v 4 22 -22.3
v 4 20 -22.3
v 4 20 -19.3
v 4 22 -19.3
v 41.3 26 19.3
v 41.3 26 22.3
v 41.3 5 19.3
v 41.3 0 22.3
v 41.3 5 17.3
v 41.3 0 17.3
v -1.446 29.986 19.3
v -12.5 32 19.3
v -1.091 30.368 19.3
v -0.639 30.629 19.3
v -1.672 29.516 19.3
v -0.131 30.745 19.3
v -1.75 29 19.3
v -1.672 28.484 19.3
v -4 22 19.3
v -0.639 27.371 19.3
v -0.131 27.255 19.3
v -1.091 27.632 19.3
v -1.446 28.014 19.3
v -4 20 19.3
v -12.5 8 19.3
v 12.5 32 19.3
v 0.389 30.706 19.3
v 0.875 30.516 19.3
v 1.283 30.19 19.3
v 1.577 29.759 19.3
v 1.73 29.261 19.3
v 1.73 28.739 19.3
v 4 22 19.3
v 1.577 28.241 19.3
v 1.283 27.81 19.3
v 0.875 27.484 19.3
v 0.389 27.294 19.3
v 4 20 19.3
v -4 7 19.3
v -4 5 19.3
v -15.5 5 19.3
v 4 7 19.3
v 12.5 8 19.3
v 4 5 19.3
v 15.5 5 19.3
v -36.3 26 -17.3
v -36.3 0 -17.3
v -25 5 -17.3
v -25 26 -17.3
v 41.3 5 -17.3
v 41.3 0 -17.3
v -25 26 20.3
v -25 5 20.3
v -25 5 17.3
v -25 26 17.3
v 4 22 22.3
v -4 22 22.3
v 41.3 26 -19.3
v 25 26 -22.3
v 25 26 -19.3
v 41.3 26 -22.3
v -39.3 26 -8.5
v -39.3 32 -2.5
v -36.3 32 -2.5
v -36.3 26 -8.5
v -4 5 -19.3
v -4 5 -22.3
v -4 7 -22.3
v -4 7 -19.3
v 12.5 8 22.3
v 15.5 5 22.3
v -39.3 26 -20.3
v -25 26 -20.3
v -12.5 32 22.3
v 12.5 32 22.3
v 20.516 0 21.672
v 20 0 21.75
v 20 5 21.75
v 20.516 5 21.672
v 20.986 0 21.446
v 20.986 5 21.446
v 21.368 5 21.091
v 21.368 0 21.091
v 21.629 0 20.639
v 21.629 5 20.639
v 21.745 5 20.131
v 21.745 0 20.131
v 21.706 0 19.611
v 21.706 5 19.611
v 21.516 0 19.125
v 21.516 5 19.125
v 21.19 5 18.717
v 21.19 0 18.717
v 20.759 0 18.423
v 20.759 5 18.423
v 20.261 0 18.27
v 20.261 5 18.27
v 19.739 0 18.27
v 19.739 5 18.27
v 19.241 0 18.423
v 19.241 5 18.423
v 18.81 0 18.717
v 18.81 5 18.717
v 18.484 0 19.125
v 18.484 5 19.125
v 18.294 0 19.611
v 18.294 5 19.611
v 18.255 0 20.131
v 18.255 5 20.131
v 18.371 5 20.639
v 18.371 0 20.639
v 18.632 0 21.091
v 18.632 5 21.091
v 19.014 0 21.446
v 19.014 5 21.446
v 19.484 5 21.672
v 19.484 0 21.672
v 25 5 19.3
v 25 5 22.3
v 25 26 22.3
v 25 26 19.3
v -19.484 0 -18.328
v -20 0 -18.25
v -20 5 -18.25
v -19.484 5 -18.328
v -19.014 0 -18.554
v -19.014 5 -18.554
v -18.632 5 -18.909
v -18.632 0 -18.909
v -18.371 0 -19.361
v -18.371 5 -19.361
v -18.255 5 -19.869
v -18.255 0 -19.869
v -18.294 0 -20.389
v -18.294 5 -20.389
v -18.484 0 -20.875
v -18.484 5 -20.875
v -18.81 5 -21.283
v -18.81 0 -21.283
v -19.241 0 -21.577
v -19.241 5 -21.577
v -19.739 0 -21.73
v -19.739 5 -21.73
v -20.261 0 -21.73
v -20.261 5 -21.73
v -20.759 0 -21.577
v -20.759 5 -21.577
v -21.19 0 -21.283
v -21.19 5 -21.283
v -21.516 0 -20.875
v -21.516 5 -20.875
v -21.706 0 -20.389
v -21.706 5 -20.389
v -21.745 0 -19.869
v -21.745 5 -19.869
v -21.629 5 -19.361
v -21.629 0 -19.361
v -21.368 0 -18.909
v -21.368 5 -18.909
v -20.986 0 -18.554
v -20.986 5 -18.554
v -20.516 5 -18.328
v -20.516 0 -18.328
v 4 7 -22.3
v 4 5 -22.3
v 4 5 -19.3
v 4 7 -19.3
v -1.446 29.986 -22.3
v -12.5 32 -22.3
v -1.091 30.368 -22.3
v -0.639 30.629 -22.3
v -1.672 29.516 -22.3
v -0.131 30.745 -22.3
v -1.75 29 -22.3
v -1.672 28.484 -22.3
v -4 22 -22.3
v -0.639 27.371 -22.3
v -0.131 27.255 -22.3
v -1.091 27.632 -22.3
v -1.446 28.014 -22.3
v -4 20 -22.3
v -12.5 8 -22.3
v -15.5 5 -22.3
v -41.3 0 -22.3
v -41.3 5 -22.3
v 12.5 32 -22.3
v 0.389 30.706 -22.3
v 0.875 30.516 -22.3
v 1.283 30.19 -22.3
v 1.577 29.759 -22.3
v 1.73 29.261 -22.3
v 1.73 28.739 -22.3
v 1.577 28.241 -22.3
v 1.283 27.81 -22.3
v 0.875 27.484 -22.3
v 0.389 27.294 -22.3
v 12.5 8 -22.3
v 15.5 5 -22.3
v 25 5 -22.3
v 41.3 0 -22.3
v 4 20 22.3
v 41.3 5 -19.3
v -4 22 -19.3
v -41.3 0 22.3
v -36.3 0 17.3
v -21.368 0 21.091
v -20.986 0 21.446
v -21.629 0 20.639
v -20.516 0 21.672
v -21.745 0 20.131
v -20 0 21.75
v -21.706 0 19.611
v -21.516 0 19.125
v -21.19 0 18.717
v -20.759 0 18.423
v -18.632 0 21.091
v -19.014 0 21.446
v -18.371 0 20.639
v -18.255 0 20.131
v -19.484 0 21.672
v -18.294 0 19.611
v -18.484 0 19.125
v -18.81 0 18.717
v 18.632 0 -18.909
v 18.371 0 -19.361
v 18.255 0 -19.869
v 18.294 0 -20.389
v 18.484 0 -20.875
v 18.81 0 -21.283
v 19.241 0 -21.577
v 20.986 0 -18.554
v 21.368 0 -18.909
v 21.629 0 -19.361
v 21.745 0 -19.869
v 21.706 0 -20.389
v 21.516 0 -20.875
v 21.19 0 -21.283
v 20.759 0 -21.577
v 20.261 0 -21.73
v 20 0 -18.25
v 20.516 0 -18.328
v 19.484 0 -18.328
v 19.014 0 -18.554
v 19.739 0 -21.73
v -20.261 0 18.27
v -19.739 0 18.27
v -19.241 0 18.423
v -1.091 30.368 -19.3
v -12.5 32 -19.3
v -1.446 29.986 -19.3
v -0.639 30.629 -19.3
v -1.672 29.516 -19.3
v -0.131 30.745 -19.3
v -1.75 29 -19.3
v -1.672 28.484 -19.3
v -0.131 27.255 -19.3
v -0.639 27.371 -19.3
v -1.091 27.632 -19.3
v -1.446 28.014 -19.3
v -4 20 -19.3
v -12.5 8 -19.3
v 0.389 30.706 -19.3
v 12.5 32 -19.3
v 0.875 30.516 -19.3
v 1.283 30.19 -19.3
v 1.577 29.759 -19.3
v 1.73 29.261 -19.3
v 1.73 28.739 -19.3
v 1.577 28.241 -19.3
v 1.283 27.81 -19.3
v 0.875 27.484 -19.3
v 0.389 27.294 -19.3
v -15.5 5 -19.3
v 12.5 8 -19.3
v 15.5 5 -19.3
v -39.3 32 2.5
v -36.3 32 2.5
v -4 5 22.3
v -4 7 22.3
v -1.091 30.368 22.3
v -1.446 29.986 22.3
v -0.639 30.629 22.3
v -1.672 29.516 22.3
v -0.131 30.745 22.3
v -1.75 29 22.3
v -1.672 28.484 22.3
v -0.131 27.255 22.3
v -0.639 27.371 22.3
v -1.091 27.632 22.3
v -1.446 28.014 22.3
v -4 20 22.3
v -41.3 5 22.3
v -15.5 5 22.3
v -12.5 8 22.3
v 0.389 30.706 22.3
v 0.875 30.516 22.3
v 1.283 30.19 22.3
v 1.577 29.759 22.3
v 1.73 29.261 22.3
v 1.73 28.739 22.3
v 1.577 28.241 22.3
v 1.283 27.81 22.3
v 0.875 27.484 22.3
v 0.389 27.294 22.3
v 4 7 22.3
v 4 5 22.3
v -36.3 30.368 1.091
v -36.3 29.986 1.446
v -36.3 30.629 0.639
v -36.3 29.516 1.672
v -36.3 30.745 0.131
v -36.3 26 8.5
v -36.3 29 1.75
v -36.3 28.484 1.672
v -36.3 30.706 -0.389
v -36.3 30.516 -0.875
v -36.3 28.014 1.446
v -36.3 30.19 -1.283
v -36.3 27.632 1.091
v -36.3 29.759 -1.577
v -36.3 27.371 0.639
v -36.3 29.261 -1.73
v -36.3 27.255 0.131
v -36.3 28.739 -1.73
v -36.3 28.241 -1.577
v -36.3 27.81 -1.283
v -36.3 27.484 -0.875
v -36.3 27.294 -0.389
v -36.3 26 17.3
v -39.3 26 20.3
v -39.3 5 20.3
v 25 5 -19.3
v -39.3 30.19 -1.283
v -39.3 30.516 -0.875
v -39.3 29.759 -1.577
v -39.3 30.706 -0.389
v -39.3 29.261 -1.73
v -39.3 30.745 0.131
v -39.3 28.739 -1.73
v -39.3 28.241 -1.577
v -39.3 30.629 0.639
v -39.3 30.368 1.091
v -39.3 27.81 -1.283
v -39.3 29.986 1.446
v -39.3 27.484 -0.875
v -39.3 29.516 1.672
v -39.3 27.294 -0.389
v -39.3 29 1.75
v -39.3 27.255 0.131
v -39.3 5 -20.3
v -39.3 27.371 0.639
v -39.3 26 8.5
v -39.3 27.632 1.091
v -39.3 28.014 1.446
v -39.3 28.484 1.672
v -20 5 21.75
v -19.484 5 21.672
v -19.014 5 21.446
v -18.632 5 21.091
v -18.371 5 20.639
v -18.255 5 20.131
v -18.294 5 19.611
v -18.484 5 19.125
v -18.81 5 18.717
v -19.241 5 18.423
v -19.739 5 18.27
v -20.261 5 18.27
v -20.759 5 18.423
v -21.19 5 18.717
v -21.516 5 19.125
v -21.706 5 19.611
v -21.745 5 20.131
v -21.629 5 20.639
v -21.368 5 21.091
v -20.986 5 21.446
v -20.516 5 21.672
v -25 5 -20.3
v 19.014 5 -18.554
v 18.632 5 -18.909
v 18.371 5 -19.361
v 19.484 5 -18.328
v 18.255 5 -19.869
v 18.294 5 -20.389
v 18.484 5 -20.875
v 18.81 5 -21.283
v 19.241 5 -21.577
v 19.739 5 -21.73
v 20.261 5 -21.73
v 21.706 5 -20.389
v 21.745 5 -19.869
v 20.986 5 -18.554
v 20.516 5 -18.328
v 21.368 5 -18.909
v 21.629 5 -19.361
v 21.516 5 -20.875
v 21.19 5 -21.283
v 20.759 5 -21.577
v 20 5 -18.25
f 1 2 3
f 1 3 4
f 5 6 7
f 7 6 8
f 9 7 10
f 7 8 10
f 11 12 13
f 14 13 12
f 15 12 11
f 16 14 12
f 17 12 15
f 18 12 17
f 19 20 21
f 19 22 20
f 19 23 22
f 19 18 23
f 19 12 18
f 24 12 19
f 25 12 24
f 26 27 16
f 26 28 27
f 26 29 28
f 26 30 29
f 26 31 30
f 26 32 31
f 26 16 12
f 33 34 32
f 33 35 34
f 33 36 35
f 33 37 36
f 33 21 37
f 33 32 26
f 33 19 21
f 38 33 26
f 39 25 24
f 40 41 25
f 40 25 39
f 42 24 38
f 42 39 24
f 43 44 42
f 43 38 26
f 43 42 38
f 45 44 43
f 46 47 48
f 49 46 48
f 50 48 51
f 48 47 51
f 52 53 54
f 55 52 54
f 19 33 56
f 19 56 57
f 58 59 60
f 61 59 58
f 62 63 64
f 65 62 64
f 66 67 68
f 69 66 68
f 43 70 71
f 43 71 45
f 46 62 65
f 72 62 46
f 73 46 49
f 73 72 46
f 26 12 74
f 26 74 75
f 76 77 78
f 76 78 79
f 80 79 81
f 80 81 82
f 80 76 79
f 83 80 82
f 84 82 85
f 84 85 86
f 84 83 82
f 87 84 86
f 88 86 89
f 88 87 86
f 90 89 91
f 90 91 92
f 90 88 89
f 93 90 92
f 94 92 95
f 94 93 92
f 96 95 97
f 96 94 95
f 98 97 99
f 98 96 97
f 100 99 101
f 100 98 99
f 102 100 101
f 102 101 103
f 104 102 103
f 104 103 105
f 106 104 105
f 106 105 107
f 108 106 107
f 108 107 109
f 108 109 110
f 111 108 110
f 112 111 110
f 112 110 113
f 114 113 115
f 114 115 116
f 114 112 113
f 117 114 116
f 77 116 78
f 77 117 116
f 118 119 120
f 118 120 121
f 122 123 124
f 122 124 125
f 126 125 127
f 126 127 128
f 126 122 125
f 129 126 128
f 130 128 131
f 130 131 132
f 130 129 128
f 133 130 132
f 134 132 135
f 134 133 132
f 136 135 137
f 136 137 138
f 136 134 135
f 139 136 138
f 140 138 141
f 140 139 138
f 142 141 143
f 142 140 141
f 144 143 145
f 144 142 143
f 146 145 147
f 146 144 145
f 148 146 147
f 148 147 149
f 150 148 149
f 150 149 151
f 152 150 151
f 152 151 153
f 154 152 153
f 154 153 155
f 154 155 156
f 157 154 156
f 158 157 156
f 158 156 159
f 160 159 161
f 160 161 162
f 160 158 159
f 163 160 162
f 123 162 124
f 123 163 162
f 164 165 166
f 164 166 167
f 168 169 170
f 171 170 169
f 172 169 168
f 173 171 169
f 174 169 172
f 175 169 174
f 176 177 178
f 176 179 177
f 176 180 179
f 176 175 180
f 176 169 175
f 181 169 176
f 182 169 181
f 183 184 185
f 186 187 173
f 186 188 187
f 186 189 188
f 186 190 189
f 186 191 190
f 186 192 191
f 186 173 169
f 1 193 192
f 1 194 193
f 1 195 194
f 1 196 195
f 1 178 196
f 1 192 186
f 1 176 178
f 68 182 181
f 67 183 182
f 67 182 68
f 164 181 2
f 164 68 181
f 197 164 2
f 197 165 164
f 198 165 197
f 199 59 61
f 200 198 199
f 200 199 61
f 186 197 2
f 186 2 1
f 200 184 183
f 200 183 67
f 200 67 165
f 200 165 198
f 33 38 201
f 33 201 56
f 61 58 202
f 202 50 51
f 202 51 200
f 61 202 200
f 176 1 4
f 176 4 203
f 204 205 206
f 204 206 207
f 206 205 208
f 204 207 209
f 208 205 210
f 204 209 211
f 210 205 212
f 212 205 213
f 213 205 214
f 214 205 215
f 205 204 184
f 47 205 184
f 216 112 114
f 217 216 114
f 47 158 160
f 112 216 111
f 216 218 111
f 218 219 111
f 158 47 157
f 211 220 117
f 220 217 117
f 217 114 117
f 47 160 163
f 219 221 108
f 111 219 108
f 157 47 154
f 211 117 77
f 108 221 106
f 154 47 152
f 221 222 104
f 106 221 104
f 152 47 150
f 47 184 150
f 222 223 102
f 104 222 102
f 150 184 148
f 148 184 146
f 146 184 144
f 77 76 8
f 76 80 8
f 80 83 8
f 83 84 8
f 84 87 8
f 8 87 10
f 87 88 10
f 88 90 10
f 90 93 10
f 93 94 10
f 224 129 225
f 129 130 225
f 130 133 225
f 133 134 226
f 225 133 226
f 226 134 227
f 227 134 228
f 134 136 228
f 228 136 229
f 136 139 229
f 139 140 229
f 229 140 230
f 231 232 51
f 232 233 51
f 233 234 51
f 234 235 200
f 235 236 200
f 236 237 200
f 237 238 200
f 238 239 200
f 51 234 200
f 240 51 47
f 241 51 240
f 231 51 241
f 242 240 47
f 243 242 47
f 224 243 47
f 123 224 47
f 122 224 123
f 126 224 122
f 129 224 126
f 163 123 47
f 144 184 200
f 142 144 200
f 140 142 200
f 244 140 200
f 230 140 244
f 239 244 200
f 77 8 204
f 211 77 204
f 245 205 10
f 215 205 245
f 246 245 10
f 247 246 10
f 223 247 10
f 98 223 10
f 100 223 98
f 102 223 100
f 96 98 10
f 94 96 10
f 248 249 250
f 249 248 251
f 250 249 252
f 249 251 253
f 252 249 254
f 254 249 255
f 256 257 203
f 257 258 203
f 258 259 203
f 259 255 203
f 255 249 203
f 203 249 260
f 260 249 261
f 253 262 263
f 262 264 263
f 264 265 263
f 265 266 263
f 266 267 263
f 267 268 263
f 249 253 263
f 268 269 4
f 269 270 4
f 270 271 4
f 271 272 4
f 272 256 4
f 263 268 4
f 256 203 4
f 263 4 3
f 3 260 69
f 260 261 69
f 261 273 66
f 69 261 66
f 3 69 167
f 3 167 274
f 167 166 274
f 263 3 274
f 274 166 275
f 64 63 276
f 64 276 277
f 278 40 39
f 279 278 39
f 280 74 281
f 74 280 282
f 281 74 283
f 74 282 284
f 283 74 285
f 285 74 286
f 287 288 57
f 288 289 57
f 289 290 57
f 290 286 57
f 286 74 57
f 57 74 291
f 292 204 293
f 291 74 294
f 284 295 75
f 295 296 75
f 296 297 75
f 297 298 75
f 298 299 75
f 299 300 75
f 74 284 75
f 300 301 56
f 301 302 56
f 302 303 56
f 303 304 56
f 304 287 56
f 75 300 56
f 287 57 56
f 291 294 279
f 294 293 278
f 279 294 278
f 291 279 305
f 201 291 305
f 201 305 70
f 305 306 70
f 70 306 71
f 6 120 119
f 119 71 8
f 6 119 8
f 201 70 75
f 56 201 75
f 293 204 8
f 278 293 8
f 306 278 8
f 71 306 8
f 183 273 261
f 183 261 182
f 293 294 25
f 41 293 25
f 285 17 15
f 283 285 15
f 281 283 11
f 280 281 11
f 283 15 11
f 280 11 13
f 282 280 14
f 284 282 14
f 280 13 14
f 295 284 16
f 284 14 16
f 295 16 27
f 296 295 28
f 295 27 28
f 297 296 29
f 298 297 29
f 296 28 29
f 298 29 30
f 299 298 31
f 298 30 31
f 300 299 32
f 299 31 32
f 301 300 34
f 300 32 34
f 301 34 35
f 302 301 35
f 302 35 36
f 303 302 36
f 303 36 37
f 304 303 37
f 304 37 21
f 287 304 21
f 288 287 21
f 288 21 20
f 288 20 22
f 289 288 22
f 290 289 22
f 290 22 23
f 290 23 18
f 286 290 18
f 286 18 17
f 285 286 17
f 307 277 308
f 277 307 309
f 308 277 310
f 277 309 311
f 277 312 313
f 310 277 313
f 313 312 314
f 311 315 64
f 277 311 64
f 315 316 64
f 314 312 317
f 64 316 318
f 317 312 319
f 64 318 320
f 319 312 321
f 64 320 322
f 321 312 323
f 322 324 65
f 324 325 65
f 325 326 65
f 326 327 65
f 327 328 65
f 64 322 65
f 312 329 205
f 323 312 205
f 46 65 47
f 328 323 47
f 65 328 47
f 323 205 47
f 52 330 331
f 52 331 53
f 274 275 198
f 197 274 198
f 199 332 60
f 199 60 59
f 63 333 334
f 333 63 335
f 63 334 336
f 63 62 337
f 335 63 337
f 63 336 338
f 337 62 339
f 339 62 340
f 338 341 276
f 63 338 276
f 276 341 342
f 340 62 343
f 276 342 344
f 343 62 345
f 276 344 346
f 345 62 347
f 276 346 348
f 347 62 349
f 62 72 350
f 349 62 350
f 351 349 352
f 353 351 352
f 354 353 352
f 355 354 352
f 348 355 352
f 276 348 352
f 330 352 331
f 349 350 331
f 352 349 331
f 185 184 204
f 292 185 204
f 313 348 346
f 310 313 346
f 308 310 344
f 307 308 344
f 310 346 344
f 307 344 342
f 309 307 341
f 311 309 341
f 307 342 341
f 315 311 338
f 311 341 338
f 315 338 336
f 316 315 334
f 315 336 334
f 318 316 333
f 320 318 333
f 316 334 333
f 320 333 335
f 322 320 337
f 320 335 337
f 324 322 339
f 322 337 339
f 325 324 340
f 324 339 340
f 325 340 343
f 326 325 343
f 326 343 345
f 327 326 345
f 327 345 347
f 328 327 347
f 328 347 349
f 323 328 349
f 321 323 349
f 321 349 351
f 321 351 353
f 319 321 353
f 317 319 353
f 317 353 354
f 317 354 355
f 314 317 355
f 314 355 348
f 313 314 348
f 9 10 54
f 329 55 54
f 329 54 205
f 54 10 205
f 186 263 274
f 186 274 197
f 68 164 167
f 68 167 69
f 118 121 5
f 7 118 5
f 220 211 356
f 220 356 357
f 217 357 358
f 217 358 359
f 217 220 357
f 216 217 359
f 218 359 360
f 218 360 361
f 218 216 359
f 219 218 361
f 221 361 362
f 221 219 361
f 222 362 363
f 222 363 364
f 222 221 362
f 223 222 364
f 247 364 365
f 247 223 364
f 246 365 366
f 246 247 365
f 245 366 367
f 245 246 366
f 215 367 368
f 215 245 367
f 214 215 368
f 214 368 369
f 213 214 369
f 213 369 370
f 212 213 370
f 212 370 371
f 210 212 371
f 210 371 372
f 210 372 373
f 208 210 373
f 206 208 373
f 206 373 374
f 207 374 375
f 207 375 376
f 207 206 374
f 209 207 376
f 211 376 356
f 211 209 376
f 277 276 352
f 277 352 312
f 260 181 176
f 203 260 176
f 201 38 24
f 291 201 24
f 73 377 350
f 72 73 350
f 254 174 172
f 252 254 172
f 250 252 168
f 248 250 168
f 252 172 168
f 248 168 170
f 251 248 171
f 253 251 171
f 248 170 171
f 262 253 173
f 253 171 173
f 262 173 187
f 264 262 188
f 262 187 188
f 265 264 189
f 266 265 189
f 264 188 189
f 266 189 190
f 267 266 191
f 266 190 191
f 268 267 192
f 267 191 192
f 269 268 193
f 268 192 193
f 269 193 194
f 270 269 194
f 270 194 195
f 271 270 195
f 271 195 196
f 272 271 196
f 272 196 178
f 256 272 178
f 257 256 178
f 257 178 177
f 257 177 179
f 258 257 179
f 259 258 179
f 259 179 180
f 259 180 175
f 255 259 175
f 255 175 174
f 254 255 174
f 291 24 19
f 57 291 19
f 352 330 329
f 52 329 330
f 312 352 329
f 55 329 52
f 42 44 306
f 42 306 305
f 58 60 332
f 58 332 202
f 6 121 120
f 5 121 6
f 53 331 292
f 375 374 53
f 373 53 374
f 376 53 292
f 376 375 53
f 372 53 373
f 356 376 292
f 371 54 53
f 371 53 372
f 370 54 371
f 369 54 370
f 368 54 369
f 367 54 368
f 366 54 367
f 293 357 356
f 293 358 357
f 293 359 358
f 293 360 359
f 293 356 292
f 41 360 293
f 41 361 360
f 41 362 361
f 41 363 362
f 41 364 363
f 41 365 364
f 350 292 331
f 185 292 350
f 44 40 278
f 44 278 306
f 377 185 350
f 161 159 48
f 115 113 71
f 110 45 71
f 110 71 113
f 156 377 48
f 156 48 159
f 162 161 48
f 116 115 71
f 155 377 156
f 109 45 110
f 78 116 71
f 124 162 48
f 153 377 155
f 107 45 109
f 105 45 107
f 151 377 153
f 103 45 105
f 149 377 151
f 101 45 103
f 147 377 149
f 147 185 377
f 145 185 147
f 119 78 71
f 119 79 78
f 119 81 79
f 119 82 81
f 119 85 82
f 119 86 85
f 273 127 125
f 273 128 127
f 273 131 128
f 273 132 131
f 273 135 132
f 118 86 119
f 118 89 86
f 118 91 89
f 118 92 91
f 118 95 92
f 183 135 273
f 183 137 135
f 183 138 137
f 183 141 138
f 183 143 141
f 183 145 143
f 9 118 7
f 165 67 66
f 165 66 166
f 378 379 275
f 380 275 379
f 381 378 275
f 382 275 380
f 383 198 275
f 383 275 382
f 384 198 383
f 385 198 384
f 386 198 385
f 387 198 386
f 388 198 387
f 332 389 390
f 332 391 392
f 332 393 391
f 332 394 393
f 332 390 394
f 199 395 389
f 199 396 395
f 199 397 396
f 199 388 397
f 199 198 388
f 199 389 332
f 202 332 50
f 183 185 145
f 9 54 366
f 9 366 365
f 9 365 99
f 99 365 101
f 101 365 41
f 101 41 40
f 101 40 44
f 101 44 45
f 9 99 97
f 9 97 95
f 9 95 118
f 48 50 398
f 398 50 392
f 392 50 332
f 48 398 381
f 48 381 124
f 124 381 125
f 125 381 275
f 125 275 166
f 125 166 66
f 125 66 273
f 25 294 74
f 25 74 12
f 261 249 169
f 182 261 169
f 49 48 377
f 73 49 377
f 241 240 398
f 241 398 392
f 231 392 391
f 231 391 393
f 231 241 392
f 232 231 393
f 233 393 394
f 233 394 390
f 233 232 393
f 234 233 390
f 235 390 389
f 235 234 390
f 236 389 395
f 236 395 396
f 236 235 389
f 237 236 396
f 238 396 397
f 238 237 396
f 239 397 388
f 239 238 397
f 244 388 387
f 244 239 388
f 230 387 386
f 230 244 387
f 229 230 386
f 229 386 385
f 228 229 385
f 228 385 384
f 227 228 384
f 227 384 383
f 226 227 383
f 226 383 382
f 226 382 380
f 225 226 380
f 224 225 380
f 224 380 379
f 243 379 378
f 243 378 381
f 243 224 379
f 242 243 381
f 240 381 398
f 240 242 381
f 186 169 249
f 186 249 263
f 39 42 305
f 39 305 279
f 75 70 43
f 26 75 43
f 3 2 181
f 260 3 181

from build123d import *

# Parameters (mm, degrees)
CROQUIS1_R              = 1.75
SALIENTE_EXTRUIR1_DEPTH = 5
CROQUIS2_W              = 25
CROQUIS2_H              = 3
CROQUIS2_W_2            = 16.3
SALIENTE_EXTRUIR2_DEPTH = 21
CROQUIS4_W              = 3
CROQUIS4_H              = 5
SALIENTE_EXTRUIR3_DEPTH = 6
CROQUIS5_R              = 1.75
CORTAR_EXTRUIR2_DEPTH   = 90.541331239
CHAFL_N1_SIZE           = 6
CROQUIS6_W              = 25
CROQUIS6_H              = 3
SALIENTE_EXTRUIR4_DEPTH = 6
CROQUIS7_R              = 1.75
CROQUIS7_W              = 8
CROQUIS7_H              = 2
CORTAR_EXTRUIR3_DEPTH   = 69.693886191
CHAFL_N2_SIZE           = 3


with BuildPart() as part:
    # Croquis1 → Saliente-Extruir1 (new body)
    with BuildSketch(Plane(origin=(0, 0, 0), x_dir=(1, 0, 0), z_dir=(0, 1, 0))):
        Polygon((-36.3, 17.3), (36.3, 17.3), (41.3, 17.3), (41.3, 22.3), (-41.3, 22.3), (-41.3, -22.3), (41.3, -22.3), (41.3, -17.3), (36.3, -17.3), (-36.3, -17.3), align=None)
        with Locations(Location((-20, 20, 0), (0, 0, 270))):
            Circle(CROQUIS1_R, mode=Mode.SUBTRACT)
        with Locations(Location((20, 20, 0), (0, 0, 270))):
            Circle(CROQUIS1_R, mode=Mode.SUBTRACT)
        with Locations(Location((-20, -20, 0), (0, 0, 270))):
            Circle(CROQUIS1_R, mode=Mode.SUBTRACT)
        with Locations(Location((20, -20, 0), (0, 0, 270))):
            Circle(CROQUIS1_R, mode=Mode.SUBTRACT)
    extrude(amount=SALIENTE_EXTRUIR1_DEPTH)

    # Croquis2 → Saliente-Extruir2 (add)
    with BuildSketch(Plane(origin=(0, 5, 0), x_dir=(1, 0, 0), z_dir=(0, 1, 0))):
        Polygon((-39.3, 20.3), (-39.3, -20.3), (-25, -20.3), (-25, -17.3), (-36.3, -17.3), (-36.3, 17.3), (-25, 17.3), (-25, 20.3), align=None)
        with Locations((0, -20.8)):
            Rectangle(CROQUIS2_W, CROQUIS2_H)
        with Locations((0, 20.8)):
            Rectangle(CROQUIS2_W, CROQUIS2_H)
        with Locations((33.15, -20.8)):
            Rectangle(CROQUIS2_W_2, CROQUIS2_H)
        with Locations((33.15, 20.8)):
            Rectangle(CROQUIS2_W_2, CROQUIS2_H)
    extrude(amount=SALIENTE_EXTRUIR2_DEPTH)

    # Croquis4 → Saliente-Extruir3 (add)
    with BuildSketch(Plane(origin=(0, 26, 0), x_dir=(1, 0, 0), z_dir=(0, 1, 0))):
        with Locations((-37.8, 0)):
            Rectangle(CROQUIS4_W, CROQUIS4_H)
    extrude(amount=SALIENTE_EXTRUIR3_DEPTH)

    # Croquis5 → Cortar-Extruir2 (cut, through all)
    with BuildSketch(Plane.ZY.offset(39.3)):
        with Locations((0, 29)):
            Circle(CROQUIS5_R)
    extrude(amount=-CORTAR_EXTRUIR2_DEPTH, mode=Mode.SUBTRACT)

    # Chaflán1
    chafl_n1_edges = [part.edges().sort_by_distance(p)[0] for p in [
        (-37.8, 26, 2.5),
        (-37.8, 26, -2.5),
    ]]
    chamfer(chafl_n1_edges, length=CHAFL_N1_SIZE - 0.0001)  # a hair under: the kernel refuses the full size

    # Croquis6 → Saliente-Extruir4 (add)
    with BuildSketch(Plane(origin=(0, 26, 0), x_dir=(1, 0, 0), z_dir=(0, 1, 0))):
        with Locations((0, 20.8)):
            Rectangle(CROQUIS6_W, CROQUIS6_H)
        with Locations((0, -20.8)):
            Rectangle(CROQUIS6_W, CROQUIS6_H)
    extrude(amount=SALIENTE_EXTRUIR4_DEPTH)

    # Croquis7 → Cortar-Extruir3 (cut, through all)
    with BuildSketch(Plane(origin=(0, 0, -22.3), x_dir=(-1, 0, 0), z_dir=(0, 0, -1))):
        with Locations((0, 29)):
            Circle(CROQUIS7_R)
        with Locations((0, 21)):
            Rectangle(CROQUIS7_W, CROQUIS7_H)
        with Locations((0, 6)):
            Rectangle(CROQUIS7_W, CROQUIS7_H)
    extrude(amount=-CORTAR_EXTRUIR3_DEPTH, mode=Mode.SUBTRACT)

    # Chaflán2
    chafl_n2_edges = [part.edges().sort_by_distance(p)[0] for p in [
        (-12.5, 5, 20.8),
        (12.5, 5, 20.8),
        (-12.5, 5, -20.8),
        (12.5, 5, -20.8),
    ]]
    chamfer(chafl_n2_edges, length=CHAFL_N2_SIZE)


solid = part.part
